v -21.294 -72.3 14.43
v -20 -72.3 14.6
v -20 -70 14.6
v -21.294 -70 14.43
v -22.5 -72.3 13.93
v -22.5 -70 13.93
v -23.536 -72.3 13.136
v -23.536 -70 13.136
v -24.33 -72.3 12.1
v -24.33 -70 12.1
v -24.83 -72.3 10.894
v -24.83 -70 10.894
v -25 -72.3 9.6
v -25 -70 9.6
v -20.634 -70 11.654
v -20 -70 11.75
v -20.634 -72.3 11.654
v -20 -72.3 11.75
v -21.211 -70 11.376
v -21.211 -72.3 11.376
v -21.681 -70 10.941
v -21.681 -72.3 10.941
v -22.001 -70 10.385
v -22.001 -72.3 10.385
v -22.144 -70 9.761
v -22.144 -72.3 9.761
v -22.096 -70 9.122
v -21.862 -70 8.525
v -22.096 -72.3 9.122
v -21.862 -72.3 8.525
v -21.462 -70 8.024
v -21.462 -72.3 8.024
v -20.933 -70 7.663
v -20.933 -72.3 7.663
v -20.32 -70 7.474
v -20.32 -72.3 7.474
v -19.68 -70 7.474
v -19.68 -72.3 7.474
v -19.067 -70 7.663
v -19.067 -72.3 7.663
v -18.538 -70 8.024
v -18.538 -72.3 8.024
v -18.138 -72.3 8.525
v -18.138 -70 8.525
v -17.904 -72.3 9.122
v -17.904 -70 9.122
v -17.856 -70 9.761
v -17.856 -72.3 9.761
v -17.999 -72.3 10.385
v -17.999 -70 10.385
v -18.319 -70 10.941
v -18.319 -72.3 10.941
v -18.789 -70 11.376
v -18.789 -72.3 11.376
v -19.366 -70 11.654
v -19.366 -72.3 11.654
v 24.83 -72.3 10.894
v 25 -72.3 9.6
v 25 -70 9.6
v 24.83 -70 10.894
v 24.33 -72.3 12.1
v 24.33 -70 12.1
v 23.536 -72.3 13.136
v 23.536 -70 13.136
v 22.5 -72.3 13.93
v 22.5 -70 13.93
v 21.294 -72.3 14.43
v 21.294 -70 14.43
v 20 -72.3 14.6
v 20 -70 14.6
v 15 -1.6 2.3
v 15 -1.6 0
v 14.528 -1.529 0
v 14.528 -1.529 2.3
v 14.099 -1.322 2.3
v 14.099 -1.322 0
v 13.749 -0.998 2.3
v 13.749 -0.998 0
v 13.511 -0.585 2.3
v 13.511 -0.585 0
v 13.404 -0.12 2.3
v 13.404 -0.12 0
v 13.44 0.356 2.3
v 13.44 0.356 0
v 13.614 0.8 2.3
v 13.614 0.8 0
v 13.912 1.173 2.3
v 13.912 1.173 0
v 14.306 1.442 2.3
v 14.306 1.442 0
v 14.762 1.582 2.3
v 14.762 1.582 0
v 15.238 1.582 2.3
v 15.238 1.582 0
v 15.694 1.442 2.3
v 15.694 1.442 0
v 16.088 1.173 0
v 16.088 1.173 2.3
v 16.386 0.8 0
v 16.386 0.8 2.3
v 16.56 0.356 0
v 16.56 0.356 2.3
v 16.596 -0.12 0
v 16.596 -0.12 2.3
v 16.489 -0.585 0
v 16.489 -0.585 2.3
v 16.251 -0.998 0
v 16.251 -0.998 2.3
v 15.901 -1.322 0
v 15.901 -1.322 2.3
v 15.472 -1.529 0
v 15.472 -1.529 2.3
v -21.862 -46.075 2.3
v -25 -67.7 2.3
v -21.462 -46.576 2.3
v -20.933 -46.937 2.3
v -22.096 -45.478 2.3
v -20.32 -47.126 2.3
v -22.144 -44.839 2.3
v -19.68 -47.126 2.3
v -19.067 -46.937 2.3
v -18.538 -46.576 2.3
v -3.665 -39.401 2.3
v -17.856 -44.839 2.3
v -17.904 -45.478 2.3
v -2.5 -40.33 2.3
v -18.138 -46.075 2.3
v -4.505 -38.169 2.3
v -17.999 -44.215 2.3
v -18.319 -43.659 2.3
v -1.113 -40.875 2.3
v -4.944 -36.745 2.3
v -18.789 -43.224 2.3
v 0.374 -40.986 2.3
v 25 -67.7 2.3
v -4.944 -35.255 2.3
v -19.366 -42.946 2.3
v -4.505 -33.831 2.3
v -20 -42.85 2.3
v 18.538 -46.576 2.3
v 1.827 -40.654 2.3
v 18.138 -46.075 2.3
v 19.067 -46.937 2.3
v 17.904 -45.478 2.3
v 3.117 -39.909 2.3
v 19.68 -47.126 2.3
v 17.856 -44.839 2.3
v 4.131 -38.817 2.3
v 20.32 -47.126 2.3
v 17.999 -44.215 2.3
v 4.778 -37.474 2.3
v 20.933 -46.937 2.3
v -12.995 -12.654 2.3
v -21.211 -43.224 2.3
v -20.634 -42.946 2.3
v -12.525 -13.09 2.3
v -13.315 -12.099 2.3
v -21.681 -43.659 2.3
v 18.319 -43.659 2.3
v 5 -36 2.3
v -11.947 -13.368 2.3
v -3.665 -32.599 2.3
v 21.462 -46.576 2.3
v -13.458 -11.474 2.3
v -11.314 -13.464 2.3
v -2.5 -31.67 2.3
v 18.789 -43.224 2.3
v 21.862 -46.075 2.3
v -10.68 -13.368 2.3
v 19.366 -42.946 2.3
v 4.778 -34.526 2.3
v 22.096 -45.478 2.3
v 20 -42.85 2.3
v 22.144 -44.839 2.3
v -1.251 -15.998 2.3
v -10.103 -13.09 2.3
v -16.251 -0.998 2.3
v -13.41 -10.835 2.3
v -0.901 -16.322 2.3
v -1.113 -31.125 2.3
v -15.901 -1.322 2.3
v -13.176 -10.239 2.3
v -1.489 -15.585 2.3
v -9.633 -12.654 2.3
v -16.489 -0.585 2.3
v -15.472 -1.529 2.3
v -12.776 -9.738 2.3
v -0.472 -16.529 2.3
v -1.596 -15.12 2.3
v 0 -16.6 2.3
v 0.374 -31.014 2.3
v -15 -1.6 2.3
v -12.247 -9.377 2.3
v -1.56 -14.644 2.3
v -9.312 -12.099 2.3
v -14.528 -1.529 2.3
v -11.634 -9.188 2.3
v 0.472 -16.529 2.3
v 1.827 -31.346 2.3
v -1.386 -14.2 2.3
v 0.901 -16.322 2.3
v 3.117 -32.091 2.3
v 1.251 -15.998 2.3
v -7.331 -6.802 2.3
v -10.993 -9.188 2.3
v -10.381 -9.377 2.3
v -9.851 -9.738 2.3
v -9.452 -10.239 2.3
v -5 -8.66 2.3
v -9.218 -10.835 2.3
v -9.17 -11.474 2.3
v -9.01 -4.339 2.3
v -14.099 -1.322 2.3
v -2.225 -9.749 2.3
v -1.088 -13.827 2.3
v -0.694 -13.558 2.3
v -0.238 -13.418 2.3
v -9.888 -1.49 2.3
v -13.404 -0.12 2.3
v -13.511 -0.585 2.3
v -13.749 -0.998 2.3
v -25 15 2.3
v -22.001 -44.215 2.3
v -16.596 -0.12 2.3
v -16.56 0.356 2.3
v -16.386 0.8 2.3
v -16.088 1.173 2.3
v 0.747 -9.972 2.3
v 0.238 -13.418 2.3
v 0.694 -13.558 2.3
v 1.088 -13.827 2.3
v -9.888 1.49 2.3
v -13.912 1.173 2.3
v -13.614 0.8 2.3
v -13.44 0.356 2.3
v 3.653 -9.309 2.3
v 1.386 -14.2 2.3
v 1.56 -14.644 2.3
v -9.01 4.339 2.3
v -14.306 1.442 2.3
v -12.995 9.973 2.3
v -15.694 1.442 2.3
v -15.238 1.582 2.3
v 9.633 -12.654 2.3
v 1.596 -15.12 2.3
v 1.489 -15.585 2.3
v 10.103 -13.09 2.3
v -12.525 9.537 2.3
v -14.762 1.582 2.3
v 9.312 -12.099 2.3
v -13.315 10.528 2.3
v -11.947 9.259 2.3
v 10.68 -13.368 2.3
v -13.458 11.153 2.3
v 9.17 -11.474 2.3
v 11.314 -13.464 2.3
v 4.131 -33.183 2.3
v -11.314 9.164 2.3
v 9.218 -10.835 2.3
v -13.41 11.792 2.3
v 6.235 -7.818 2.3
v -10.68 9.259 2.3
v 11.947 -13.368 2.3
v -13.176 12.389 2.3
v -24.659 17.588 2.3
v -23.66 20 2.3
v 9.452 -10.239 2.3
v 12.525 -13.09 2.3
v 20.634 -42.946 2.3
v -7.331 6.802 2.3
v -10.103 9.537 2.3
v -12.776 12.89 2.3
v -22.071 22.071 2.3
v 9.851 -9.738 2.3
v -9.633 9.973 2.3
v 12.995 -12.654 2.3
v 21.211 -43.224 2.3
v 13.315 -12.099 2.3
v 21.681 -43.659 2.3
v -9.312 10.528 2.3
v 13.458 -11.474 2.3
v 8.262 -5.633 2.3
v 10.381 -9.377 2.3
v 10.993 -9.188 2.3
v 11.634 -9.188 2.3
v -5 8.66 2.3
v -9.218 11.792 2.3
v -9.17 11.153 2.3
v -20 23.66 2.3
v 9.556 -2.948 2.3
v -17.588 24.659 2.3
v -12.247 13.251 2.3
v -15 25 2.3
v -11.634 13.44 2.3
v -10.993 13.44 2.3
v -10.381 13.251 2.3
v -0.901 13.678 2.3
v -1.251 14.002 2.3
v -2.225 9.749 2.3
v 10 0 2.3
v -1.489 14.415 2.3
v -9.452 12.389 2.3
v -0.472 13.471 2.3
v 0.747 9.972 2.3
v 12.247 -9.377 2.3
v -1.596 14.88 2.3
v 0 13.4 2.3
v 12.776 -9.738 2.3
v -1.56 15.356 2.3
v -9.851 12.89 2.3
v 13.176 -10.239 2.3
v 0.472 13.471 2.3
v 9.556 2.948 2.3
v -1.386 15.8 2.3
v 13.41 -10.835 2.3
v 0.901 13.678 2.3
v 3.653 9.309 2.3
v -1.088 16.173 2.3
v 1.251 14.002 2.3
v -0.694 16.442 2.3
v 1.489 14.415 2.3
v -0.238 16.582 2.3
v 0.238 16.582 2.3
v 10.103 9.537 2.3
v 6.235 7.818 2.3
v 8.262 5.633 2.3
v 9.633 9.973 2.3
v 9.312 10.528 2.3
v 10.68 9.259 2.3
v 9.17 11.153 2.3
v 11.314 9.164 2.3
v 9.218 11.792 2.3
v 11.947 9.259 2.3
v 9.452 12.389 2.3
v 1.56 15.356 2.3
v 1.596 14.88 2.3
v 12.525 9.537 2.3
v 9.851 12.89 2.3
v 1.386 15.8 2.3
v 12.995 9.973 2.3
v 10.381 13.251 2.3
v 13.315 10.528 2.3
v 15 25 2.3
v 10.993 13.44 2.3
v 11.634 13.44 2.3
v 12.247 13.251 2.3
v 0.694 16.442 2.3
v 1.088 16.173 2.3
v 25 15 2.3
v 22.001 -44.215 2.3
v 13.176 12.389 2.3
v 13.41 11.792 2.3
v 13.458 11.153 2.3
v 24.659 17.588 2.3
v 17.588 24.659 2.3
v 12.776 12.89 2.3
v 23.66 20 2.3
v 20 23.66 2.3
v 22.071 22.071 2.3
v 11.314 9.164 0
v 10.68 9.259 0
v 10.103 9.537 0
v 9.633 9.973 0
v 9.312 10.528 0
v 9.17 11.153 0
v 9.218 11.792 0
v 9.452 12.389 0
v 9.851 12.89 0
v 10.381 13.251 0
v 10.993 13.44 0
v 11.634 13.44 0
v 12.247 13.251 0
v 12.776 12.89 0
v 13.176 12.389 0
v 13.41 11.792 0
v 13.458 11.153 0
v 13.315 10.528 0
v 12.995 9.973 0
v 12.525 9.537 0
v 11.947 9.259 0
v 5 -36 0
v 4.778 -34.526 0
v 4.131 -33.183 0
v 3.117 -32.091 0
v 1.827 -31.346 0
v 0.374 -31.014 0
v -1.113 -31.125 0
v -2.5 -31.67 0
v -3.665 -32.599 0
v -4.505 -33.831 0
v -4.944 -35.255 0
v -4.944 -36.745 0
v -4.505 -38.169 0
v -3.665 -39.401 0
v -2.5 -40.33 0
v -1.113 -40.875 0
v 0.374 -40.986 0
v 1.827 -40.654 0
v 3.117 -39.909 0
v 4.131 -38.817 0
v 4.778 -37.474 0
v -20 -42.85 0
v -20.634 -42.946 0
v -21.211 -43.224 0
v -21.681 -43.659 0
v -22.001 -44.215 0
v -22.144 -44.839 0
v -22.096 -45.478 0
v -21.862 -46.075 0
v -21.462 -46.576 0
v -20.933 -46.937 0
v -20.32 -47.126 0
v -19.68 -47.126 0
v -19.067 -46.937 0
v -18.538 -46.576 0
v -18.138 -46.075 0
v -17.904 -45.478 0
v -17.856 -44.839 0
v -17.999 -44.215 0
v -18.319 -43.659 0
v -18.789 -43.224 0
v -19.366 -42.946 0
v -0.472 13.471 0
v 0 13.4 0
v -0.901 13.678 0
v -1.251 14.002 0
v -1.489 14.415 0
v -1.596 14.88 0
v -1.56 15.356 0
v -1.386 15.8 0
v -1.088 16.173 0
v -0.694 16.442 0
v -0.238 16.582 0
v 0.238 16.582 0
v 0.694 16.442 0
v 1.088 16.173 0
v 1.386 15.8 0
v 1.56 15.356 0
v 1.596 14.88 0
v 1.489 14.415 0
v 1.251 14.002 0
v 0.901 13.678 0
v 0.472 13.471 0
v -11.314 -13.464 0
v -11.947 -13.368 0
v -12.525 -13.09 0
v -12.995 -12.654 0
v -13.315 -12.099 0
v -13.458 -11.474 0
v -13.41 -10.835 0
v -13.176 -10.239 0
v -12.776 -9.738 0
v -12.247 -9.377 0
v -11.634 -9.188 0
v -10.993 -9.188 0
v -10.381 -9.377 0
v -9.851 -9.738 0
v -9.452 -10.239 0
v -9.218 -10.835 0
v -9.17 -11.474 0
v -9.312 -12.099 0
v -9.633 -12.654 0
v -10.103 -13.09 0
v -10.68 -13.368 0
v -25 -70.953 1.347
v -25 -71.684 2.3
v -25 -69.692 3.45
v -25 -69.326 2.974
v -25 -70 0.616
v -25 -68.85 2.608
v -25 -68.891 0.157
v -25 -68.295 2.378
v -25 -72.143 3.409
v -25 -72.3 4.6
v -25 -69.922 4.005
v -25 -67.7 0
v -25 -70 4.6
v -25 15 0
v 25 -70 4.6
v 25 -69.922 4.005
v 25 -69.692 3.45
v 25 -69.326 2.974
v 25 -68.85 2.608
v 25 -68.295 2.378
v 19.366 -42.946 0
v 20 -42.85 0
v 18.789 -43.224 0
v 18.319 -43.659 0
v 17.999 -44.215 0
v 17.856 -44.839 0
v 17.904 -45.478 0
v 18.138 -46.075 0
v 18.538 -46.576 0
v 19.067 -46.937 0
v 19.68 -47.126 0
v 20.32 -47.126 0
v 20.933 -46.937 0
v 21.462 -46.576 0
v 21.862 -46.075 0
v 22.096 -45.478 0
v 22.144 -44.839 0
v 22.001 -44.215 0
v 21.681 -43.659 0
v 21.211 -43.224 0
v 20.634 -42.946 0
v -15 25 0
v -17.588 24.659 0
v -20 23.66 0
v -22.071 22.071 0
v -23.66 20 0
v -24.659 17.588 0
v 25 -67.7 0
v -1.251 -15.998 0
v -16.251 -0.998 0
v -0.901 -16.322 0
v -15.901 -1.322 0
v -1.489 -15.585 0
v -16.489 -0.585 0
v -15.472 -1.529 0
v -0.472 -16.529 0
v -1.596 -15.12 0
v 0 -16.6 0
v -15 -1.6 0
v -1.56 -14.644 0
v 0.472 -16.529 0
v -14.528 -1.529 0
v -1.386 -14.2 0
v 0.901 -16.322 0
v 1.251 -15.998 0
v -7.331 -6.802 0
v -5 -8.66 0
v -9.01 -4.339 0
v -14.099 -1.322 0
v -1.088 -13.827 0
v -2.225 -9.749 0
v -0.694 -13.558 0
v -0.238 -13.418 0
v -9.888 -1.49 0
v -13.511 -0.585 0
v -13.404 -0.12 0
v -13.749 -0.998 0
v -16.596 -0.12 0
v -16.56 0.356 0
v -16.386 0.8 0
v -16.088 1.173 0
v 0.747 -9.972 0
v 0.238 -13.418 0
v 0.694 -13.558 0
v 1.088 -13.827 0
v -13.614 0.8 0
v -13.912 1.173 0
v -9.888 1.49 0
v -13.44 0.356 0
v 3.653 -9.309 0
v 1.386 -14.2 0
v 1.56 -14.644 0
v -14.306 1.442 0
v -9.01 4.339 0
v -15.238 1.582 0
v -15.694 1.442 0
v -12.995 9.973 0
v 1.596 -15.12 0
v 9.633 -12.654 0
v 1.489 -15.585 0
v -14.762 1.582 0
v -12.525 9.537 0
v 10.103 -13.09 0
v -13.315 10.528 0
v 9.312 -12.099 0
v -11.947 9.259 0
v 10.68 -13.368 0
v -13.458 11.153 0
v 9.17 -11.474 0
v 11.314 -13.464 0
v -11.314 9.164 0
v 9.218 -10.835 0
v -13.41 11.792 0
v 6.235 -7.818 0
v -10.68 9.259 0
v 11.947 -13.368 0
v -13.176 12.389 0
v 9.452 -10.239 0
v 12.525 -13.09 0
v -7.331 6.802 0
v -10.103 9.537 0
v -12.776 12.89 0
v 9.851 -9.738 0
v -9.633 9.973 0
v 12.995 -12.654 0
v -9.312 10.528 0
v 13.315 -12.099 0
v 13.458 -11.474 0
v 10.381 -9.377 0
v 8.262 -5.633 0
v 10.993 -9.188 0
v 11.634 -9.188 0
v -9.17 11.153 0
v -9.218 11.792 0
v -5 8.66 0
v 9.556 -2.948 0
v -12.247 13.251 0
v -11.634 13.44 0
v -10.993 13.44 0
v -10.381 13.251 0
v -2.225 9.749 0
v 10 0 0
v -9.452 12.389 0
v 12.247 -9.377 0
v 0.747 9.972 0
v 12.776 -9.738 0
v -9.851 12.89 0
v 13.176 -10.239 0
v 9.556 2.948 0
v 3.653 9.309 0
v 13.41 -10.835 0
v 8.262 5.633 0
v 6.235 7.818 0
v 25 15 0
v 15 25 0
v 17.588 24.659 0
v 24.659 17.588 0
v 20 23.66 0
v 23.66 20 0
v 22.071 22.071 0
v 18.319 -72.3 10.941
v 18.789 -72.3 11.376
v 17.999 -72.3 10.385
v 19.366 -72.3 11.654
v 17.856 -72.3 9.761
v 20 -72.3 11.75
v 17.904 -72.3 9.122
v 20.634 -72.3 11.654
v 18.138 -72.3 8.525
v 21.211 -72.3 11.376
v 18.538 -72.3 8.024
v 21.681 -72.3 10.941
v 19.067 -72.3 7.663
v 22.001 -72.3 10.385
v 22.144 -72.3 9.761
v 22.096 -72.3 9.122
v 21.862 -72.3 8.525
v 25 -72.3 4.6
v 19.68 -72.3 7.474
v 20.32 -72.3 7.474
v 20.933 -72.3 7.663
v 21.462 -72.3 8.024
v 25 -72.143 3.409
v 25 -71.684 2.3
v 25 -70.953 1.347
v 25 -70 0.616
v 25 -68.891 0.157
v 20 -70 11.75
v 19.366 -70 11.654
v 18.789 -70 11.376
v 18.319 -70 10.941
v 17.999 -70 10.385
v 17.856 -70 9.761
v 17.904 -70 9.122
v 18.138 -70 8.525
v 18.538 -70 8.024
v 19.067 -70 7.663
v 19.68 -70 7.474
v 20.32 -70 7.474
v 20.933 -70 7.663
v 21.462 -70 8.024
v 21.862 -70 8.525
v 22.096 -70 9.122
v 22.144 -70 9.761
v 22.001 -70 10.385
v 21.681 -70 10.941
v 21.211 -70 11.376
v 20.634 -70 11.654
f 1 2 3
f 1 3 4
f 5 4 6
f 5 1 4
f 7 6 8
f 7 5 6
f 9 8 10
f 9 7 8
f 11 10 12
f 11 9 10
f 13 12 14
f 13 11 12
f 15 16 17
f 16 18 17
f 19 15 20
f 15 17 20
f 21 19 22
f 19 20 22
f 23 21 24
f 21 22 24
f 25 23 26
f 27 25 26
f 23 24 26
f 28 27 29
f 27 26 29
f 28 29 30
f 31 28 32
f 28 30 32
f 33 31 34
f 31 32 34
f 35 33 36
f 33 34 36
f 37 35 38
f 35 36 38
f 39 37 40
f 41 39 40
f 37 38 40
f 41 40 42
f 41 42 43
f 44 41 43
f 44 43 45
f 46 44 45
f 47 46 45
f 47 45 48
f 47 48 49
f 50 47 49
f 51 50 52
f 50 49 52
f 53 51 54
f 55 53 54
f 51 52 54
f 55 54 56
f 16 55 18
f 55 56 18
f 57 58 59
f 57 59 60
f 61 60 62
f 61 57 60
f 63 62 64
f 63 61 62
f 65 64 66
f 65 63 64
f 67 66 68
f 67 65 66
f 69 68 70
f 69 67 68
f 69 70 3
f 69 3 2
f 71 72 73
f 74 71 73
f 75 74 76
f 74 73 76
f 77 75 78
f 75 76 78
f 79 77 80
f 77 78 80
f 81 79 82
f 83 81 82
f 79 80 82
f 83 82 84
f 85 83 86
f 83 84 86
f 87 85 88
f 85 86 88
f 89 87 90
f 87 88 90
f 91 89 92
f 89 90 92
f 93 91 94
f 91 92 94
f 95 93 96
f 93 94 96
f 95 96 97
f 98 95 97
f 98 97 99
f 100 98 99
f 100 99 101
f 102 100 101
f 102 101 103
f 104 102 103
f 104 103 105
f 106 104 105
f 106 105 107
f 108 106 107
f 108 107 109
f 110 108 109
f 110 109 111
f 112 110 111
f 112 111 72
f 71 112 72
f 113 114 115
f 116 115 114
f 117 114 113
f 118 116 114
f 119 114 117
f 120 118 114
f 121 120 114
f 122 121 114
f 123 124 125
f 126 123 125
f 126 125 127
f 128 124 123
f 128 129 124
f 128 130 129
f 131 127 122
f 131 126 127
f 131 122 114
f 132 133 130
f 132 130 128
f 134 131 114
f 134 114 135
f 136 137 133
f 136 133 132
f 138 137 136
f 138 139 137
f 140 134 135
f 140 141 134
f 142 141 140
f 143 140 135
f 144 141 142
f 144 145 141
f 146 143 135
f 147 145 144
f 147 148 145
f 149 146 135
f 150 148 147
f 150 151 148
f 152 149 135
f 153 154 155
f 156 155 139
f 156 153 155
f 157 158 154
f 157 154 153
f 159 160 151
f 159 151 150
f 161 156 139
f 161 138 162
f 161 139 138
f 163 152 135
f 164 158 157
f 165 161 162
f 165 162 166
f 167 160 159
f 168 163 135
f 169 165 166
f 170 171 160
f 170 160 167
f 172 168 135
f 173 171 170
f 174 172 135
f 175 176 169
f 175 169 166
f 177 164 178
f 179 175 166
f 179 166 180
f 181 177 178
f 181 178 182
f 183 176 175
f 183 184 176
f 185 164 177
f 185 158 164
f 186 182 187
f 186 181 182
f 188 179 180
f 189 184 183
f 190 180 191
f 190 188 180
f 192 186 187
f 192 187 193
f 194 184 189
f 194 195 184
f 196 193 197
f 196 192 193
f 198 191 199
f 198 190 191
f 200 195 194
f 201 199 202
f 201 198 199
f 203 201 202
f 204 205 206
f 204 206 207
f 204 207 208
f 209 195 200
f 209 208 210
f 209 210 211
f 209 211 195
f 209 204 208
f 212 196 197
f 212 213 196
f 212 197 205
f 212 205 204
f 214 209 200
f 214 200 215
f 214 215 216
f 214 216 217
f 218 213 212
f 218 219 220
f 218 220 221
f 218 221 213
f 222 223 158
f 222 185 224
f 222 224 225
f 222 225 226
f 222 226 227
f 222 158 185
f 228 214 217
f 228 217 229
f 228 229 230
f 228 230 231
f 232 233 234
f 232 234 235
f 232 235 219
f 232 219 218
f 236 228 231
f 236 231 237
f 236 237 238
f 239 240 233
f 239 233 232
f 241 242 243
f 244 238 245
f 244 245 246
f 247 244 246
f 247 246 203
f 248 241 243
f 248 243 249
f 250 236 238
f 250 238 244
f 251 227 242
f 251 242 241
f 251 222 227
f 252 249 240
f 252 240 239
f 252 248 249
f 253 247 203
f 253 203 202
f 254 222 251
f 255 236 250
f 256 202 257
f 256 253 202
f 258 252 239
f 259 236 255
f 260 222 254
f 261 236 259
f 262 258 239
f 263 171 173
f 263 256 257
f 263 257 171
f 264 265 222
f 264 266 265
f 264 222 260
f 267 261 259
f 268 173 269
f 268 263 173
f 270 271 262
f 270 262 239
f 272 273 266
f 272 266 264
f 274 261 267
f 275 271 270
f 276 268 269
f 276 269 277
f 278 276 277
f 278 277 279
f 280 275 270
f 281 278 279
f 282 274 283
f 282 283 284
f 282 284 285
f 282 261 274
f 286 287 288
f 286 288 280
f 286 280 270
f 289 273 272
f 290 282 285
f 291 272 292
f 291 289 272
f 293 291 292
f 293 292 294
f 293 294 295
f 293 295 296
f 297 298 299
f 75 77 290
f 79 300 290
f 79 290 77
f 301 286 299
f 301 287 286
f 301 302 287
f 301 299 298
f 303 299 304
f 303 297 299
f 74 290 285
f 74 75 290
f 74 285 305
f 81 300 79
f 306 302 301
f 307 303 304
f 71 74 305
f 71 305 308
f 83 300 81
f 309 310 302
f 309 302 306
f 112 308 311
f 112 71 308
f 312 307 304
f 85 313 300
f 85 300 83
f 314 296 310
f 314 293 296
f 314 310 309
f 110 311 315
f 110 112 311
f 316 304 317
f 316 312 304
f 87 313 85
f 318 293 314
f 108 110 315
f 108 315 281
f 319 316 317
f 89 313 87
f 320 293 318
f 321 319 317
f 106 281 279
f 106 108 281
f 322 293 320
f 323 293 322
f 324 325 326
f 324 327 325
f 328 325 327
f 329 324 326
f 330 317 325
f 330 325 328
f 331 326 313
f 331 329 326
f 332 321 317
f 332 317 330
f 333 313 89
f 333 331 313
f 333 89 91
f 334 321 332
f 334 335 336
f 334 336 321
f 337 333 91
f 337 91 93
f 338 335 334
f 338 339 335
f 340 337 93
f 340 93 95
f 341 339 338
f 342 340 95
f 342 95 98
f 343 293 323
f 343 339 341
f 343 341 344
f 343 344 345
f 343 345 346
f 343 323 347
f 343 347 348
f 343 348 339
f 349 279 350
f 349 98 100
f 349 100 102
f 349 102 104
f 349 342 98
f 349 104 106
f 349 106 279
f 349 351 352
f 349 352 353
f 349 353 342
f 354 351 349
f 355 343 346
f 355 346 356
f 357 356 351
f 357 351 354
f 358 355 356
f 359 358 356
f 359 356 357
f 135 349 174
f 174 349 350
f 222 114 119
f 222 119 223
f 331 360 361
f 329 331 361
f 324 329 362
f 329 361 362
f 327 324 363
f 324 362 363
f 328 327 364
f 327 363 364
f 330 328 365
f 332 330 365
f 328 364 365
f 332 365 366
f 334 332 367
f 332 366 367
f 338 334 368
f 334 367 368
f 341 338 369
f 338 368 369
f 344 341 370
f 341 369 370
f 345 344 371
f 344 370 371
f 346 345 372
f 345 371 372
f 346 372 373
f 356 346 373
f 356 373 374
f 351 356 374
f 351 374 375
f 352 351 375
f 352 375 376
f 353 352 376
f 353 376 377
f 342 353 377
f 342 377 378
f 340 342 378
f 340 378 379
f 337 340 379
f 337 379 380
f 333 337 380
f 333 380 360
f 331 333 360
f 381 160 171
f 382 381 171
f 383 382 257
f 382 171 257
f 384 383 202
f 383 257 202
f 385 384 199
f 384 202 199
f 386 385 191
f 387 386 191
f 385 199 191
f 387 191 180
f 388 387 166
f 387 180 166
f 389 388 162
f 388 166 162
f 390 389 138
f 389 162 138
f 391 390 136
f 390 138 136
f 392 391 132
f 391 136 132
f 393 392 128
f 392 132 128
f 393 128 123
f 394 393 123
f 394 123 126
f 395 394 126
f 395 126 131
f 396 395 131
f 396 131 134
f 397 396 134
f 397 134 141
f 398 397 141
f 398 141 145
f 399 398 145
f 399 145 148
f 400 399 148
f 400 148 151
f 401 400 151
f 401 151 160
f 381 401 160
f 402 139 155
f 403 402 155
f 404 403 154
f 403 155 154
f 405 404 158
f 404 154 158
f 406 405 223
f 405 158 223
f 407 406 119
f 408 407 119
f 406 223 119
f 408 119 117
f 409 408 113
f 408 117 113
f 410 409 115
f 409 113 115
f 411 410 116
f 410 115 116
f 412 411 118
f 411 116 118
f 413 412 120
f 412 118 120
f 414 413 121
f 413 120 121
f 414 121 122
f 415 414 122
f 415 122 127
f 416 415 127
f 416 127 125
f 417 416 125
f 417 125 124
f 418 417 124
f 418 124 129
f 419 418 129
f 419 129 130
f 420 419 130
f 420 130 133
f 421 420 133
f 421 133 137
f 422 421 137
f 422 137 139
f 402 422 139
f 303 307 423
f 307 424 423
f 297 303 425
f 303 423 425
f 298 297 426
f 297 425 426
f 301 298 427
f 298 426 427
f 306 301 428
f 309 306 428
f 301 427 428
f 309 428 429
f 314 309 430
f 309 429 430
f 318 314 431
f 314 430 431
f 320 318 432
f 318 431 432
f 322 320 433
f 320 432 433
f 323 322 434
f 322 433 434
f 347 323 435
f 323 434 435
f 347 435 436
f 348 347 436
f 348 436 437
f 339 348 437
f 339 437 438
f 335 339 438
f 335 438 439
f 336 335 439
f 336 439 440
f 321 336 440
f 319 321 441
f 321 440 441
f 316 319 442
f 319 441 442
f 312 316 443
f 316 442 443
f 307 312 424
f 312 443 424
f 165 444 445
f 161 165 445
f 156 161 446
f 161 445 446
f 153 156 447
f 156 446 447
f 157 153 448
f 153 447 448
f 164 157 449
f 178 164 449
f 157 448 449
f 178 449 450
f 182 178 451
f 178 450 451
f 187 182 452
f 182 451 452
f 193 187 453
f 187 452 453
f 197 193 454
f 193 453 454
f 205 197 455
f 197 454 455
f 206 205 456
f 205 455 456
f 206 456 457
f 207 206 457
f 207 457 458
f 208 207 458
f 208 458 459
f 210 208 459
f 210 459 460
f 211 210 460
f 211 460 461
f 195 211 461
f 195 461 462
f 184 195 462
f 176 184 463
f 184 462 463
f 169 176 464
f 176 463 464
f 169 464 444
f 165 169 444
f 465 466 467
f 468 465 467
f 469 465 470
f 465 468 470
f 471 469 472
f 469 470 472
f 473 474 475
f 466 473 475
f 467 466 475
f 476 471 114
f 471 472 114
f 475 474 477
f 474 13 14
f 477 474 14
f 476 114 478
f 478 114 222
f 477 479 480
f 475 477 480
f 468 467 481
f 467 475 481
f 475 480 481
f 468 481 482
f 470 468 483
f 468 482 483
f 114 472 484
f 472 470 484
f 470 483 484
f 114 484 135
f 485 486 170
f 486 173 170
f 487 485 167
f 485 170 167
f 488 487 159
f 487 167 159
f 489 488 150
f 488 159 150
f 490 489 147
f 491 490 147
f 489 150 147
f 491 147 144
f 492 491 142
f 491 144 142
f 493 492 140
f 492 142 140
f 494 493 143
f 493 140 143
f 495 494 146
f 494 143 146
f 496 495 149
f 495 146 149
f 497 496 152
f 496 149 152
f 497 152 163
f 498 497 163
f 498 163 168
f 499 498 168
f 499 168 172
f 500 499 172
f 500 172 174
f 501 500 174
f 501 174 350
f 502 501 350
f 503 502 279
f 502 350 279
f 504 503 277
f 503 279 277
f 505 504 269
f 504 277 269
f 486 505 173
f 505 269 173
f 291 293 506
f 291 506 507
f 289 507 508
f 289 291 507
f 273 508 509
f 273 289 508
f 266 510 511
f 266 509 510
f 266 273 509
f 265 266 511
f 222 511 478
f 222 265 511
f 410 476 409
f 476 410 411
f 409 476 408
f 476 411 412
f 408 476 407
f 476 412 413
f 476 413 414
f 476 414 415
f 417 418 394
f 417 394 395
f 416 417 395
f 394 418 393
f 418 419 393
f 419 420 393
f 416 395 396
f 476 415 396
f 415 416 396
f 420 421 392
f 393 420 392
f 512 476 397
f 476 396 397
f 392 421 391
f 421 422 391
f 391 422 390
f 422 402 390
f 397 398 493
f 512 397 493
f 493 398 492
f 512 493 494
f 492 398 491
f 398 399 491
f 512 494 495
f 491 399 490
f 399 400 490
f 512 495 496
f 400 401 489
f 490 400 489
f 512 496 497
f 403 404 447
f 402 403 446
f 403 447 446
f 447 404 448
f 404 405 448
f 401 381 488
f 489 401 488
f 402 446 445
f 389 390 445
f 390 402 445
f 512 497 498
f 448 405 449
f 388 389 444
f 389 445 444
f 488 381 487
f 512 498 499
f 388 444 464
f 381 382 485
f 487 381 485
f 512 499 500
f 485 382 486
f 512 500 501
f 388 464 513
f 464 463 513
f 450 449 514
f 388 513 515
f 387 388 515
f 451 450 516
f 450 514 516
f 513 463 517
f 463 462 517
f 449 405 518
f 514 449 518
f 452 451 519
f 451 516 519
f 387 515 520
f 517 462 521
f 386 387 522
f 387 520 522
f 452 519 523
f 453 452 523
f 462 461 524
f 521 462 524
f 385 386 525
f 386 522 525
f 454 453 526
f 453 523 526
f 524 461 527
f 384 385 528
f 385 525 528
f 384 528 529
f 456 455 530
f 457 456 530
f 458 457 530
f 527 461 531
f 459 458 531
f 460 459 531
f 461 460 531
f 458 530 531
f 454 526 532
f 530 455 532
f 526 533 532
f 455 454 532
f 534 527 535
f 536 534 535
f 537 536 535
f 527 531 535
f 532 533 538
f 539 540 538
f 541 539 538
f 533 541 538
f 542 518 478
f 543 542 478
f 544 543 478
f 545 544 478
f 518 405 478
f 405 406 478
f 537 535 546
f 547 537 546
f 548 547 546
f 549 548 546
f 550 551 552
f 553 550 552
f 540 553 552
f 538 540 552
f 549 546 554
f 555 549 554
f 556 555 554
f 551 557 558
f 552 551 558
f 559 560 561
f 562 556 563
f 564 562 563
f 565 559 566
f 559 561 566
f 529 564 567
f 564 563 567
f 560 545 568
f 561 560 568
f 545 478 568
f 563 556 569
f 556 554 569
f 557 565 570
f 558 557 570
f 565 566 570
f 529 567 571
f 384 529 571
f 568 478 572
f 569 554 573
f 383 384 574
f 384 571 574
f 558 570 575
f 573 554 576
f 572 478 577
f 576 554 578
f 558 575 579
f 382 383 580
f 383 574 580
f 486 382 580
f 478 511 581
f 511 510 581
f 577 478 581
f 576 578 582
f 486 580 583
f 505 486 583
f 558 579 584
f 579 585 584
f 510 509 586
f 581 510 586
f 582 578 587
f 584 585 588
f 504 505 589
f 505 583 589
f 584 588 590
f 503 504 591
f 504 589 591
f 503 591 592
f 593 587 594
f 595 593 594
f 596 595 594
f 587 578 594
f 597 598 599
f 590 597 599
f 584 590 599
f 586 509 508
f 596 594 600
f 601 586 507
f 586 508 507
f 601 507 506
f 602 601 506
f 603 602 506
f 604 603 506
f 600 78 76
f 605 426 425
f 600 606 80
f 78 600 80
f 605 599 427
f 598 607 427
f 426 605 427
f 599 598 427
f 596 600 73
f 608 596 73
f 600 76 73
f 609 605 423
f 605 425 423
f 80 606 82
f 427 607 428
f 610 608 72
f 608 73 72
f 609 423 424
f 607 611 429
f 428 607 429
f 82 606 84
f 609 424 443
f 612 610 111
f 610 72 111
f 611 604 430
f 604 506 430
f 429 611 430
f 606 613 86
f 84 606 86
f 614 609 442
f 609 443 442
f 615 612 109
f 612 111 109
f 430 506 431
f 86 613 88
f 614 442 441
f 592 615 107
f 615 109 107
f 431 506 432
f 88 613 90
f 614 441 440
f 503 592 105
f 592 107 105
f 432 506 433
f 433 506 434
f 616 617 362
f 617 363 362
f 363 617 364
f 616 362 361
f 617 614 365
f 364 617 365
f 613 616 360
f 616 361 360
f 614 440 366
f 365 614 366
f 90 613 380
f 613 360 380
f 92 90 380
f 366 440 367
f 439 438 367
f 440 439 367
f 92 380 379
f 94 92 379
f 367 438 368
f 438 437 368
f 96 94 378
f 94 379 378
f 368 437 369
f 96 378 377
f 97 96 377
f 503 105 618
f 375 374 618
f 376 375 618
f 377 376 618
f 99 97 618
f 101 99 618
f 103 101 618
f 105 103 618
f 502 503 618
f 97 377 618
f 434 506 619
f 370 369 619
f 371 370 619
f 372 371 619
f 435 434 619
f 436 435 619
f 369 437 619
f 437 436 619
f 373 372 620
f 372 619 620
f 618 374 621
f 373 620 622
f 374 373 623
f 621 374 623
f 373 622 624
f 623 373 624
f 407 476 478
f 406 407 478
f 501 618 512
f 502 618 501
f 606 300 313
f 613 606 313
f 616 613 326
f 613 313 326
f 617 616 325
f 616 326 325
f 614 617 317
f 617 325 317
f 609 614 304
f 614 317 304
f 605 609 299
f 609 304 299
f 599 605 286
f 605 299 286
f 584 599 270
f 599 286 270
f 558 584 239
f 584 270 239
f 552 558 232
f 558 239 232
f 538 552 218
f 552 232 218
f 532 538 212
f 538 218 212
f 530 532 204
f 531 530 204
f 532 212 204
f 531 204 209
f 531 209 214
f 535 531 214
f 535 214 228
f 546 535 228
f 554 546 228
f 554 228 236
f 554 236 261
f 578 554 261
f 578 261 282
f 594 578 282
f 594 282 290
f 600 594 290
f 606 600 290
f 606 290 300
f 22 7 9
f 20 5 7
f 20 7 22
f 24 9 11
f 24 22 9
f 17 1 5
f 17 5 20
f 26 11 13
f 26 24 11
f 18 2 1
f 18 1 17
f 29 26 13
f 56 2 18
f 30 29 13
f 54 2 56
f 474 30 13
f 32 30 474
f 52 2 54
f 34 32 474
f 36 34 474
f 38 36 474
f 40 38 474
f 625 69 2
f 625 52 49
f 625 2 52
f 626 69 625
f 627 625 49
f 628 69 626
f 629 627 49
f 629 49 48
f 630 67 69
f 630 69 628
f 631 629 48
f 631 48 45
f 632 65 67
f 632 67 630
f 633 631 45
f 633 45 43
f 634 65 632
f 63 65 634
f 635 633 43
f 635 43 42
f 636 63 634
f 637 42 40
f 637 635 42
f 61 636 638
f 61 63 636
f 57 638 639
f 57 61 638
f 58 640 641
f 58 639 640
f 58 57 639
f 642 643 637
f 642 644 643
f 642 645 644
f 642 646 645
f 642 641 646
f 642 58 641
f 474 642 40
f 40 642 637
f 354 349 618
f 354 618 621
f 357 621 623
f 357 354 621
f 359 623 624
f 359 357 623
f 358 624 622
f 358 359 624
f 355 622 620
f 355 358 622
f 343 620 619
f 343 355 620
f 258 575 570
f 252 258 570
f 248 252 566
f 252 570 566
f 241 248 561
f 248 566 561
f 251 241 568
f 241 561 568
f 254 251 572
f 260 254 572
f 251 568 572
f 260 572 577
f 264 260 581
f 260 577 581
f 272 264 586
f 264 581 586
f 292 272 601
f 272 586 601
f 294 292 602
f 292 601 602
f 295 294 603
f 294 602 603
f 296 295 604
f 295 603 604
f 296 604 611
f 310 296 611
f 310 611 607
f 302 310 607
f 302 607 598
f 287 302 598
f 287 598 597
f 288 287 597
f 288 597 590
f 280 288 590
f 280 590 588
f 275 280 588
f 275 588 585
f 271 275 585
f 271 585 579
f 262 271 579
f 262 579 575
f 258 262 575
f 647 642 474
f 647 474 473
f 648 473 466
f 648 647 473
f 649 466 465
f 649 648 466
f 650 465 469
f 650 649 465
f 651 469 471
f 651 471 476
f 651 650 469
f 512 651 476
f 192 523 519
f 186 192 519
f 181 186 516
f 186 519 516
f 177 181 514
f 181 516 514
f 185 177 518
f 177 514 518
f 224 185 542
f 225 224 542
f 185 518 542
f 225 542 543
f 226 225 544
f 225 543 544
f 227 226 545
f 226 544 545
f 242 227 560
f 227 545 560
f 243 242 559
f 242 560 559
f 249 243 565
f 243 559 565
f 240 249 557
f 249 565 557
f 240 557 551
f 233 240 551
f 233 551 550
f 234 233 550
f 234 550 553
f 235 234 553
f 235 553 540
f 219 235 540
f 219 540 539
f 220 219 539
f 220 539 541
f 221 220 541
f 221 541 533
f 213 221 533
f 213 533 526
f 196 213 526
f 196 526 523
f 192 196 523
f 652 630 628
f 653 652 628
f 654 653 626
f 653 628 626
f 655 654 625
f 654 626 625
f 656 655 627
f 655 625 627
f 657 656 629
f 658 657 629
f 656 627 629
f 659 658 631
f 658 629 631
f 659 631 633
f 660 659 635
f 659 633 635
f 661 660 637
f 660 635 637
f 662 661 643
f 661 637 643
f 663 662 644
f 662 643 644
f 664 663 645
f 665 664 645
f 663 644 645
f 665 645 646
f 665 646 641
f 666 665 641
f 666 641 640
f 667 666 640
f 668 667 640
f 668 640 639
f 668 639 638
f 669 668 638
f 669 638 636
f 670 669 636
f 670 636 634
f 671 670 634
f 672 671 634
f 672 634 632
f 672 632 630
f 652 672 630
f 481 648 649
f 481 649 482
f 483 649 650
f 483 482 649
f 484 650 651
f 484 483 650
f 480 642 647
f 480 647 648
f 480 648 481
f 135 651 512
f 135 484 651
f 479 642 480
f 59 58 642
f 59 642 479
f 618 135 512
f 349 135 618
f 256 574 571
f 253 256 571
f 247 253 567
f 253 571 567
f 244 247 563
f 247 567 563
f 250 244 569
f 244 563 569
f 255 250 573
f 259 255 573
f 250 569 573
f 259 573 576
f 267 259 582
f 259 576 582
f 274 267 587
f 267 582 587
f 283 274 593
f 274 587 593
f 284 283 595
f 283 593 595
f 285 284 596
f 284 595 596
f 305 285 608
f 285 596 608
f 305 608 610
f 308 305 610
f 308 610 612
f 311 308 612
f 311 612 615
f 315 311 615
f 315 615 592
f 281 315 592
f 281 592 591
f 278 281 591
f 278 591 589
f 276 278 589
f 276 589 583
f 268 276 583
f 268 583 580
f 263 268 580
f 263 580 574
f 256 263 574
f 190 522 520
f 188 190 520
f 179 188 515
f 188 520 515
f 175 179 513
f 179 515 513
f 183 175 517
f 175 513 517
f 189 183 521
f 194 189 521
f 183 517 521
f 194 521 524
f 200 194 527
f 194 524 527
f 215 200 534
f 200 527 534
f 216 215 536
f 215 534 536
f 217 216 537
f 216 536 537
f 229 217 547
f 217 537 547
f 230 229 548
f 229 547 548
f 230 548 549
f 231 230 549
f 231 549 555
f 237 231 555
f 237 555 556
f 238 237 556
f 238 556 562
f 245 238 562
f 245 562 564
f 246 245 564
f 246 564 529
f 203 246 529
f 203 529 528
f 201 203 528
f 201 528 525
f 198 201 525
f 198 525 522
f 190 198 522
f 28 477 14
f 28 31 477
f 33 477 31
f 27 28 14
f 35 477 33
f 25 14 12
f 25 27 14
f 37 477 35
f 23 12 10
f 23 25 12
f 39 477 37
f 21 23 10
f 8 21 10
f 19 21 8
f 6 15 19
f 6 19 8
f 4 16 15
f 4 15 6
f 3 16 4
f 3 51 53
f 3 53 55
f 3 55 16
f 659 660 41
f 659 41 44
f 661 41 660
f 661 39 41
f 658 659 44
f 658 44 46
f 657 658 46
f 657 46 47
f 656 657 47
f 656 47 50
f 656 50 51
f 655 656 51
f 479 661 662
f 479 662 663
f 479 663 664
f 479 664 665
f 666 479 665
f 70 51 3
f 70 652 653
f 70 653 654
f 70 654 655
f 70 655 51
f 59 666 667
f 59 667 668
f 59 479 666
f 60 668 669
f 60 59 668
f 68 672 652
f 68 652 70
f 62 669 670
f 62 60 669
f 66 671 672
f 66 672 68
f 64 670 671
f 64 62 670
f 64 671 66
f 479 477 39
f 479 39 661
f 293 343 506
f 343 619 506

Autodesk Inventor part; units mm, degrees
ref_plane "YZ Plane" through (0, 0, 0) normal (1, 0, 0) x (0, 1, 0)
ref_plane "XZ Plane" through (0, 0, 0) normal (0, 1, 0) x (-1, 0, 0)
ref_plane "XY Plane" through (0, 0, 0) normal (0, 0, 1) x (1, 0, 0)
sketch "スケッチ1" plane through (0, 0, 0) normal (0, 0, 1) x (1, 0, 0)
  line L0 (-25, -72.3) -> (25, -72.3)
  line L1 (25, -72.3) -> (25, 25)
  line L2 (25, 25) -> (-25, 25)
  line L3 (-25, 25) -> (-25, -72.3)
  line L4 (-25, -72.3) -> (25, 25) construction
  line L5 (25, -72.3) -> (-25, 25) construction
  circle A0 centre (0, 0) radius 19 construction
  point P0 (0, -23.65)
  point P1 (0, -23.65)
  dimension "d0" = 38
  dimension "d1" = 50
  dimension "d2" = 25
  dimension "d3" = 72.3
extrude "プレート1" add sketch "スケッチ1" along normal blind 2.3
sketch "スケッチ9" plane through (25, -70, 0) normal (0, -1, 0) x (1, 0, 0)
  line L0 (-50, 0) -> (0, 0)
  line L1 (0, 0) -> (0, 14.6)
  line L2 (0, 14.6) -> (-50, 14.6)
  line L3 (-50, 14.6) -> (-50, 0)
edge flange "フランジ3" height 14.6 angle 90 thickness 2.3 bend radius 2.3 thickness toward (0, -1, 0) relief tear relief width 2.3 relief depth 1.15 edges at (0, -72.3, 2.3) wall of the first edge with corners at (-25, -70, 0) (25, -70, 0) (25, -70, 14.6) (-25, -70, 14.6)
bend "曲げ3"
corner "コーナー3"
fillet "コーナーR1" radius 5 2 edges at (25, -71.15, 14.6) (-25, -71.15, 14.6)
sketch "スケッチ4" plane through (0, 0, 2.3) normal (0, 0, 1) x (1, 0, 0)
  circle A0 centre (0, 0) radius 15
  point P0 (0, 15)
  point P1 (-15, 0)
  point P2 (0, -15)
  point P3 (15, 0)
  dimension "d26" = 30
  dimension "d29" = 360
hole "穴1" at (0, 15, 2.3) at (-15, 0, 2.3) at (0, -15, 2.3) at (15, 0, 2.3) direction (0, 0, -1) diameter 3.2 end through all clearance for "Flat Head Machine Screw" size "M3" standard "Ansi Metric M Profile"
sketch "スケッチ5" plane through (0, 0, 2.3) normal (0, 0, 1) x (1, 0, 0)
  circle A0 centre (0, 0) radius 16
  point P0 (-11.3137, 11.3137)
  point P1 (-11.3137, -11.3137)
  point P2 (11.3137, -11.3137)
  point P3 (11.3137, 11.3137)
  dimension "d38" = 32
  dimension "d41" = 360
hole "穴2" at (-11.3137, 11.3137, 2.3) at (-11.3137, -11.3137, 2.3) at (11.3137, -11.3137, 2.3) at (11.3137, 11.3137, 2.3) direction (0, 0, -1) diameter 4.3 end through all clearance for "Flat Head Machine Screw" size "M4" standard "Ansi Metric M Profile"
sketch "スケッチ6" plane through (0, 0, 2.3) normal (0, 0, 1) x (1, 0, 0)
  circle A0 centre (0, 0) radius 10
  dimension "d50" = 20
extrude "押し出し1" cut sketch "スケッチ6" against normal blind 10
sketch "スケッチ7" plane through (-25, -70, -2.3) normal (0, 1, 0) x (1, 0, 0)
  line L0 (5, -16.9) -> (45, -16.9) projected
  line L1 (0, -6.9) -> (0, -11.9) projected
  line L2 (50, -6.9) -> (50, -11.9) projected
  point P0 (18, -2.3)
  point P1 (45, -11.9)
  point P2 (5, -11.9)
  dimension "d76" = 5
  dimension "d77" = 5
  dimension "d78" = 5
hole "穴3" at (20, -70, 9.6) at (-20, -70, 9.6) direction (0, -1, 0) diameter 4.3 end through all clearance for "Flat Head Machine Screw" size "M4" standard "Ansi Metric M Profile"
fillet "コーナーR3" radius 10 2 edges at (-25, 25, 1.15) (25, 25, 1.15)
sketch "スケッチ10" plane through (0, 0, 0) normal (0, 0, -1) x (-1, 0, 0)
  line L0 (-25, -67.7) -> (-25, 15) projected
  line L1 (25, 15) -> (25, -67.7) projected
  circle A0 centre (-20, -45) radius 4
  circle A1 centre (0, 0) radius 45
  point P0 (20, -45)
  dimension "d80" = 5
  dimension "d81" = 5
  dimension "d82" = 45
  dimension "d83" = 8
  dimension "d84" = 90
hole "穴4" at (20, -45, 0) at (-20, -45, 0) direction (0, 0, 1) diameter 4.3 end through all clearance for "Flat Head Machine Screw" size "M4" standard "Ansi Metric M Profile"
sketch "スケッチ11" plane through (0, 0, 2.3) normal (0, 0, 1) x (1, 0, 0)
  circle A0 centre (0, -36) radius 5
  point P0 (0, 0)
  dimension "d92" = 10
  dimension "d93" = 36
extrude "押し出し3" cut sketch "スケッチ11" against normal blind 10
equation "\"d36\" = Thickness"
equation "\"d48\" = Thickness"
equation "\"d77\" = d76"
equation "\"d61\" = Thickness"
equation "\"d90\" = Thickness"
equation "\"d4\" = Thickness"
equation "\"d66\" = BendReliefWidth"
equation "\"d67\" = BendReliefDepth"
equation "\"d68\" = MinimumRemnant"
equation "\"d69\" = TransitionRadius"
equation "\"d72\" = BendRadius"
equation "\"d73\" = CornerReliefSize"
equation "\"d74\" = GapSize"
equation "\"d75\" = JacobiRadiusSize"
equation "\"d2\" = 0.5 * d1"
equation "\"BendRadius\" = Thickness"
equation "\"BendReliefWidth\" = Thickness"
equation "\"BendReliefDepth\" = 0.5 * Thickness"
equation "\"CornerReliefSize\" = 4 * Thickness"
equation "\"MinimumRemnant\" = 2 * Thickness"
equation "\"TransitionRadius\" = BendRadius"
equation "\"JacobiRadiusSize\" = BendRadius"
equation "\"GapSize\" = Thickness"
equation "\"Thickness\" = 2.3"
properties part number "plate8" material "鋼、炭素鋼"
